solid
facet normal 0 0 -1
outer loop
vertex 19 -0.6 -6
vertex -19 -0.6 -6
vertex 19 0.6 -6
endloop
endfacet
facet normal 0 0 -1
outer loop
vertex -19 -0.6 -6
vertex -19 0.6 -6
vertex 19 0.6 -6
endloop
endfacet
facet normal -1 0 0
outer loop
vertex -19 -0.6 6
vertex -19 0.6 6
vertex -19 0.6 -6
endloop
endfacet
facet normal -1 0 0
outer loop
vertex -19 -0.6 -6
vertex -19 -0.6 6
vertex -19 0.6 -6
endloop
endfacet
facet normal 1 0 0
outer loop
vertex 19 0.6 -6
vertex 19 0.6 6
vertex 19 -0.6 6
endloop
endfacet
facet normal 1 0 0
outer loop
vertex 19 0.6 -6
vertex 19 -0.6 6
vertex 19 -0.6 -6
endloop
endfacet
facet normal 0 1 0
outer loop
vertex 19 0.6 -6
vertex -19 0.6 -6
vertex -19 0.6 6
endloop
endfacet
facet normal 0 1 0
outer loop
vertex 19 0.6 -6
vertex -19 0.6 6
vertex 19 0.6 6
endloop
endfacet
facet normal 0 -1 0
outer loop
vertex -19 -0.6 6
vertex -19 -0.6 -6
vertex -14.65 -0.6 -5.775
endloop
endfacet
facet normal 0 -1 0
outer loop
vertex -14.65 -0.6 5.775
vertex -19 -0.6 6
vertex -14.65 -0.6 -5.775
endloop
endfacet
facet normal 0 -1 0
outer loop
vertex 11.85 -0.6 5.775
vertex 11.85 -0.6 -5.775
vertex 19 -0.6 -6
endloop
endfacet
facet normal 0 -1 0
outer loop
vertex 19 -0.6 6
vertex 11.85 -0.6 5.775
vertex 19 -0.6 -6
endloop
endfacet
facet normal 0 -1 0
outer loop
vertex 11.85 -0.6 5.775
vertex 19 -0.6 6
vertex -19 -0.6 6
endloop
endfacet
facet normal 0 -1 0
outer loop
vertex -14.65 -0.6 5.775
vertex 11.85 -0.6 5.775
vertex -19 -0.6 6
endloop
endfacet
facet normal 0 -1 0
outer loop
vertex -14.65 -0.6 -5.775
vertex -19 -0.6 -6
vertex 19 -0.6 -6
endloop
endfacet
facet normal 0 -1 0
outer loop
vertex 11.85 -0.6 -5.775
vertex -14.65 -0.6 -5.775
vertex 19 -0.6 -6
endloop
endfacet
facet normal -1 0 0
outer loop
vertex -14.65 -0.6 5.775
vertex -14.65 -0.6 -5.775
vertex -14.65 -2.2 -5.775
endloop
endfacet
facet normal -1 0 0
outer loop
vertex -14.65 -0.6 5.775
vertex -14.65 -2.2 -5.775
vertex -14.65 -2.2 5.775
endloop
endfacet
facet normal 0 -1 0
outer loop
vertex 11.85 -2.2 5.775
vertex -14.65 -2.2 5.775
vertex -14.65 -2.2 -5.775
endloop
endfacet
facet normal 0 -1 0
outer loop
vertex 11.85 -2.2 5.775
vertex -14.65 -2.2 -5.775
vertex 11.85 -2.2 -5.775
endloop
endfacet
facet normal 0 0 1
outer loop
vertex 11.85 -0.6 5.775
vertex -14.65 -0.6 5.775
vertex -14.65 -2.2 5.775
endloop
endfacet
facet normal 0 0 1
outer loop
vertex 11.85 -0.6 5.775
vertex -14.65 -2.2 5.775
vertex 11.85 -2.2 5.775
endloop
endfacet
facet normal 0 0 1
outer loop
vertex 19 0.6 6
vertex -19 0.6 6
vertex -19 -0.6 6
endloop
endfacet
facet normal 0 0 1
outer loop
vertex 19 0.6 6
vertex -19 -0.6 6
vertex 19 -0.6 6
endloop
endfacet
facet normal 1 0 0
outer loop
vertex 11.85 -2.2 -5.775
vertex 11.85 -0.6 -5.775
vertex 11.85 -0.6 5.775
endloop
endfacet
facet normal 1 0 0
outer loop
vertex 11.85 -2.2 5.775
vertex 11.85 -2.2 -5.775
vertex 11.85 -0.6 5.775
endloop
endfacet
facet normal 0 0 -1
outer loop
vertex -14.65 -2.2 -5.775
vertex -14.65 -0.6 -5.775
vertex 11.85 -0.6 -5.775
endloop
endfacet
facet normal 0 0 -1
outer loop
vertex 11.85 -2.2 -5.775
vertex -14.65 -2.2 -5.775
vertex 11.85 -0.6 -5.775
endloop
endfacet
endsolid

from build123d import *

# Parameters (mm, degrees)
SKETCH1_W           = 38
SKETCH1_H           = 12
BOSS_EXTRUDE1_DEPTH = 0.6
SKETCH2_W           = 26.5
SKETCH2_H           = 11.55
BOSS_EXTRUDE2_DEPTH = 1.6


with BuildPart() as part:
    # Sketch1 → Boss-Extrude1 (new, symmetric)
    with BuildSketch(Plane(origin=(0, 0, 0), x_dir=(1, 0, 0), z_dir=(0, 1, 0))):
        Rectangle(SKETCH1_W, SKETCH1_H)
    extrude(amount=BOSS_EXTRUDE1_DEPTH, both=True)

    # Sketch2 → Boss-Extrude2 (add)
    with BuildSketch(Plane.XZ.offset(0.6)):
        with Locations((-1.4, 0)):
            Rectangle(SKETCH2_W, SKETCH2_H)
    extrude(amount=BOSS_EXTRUDE2_DEPTH)


solid = part.part
